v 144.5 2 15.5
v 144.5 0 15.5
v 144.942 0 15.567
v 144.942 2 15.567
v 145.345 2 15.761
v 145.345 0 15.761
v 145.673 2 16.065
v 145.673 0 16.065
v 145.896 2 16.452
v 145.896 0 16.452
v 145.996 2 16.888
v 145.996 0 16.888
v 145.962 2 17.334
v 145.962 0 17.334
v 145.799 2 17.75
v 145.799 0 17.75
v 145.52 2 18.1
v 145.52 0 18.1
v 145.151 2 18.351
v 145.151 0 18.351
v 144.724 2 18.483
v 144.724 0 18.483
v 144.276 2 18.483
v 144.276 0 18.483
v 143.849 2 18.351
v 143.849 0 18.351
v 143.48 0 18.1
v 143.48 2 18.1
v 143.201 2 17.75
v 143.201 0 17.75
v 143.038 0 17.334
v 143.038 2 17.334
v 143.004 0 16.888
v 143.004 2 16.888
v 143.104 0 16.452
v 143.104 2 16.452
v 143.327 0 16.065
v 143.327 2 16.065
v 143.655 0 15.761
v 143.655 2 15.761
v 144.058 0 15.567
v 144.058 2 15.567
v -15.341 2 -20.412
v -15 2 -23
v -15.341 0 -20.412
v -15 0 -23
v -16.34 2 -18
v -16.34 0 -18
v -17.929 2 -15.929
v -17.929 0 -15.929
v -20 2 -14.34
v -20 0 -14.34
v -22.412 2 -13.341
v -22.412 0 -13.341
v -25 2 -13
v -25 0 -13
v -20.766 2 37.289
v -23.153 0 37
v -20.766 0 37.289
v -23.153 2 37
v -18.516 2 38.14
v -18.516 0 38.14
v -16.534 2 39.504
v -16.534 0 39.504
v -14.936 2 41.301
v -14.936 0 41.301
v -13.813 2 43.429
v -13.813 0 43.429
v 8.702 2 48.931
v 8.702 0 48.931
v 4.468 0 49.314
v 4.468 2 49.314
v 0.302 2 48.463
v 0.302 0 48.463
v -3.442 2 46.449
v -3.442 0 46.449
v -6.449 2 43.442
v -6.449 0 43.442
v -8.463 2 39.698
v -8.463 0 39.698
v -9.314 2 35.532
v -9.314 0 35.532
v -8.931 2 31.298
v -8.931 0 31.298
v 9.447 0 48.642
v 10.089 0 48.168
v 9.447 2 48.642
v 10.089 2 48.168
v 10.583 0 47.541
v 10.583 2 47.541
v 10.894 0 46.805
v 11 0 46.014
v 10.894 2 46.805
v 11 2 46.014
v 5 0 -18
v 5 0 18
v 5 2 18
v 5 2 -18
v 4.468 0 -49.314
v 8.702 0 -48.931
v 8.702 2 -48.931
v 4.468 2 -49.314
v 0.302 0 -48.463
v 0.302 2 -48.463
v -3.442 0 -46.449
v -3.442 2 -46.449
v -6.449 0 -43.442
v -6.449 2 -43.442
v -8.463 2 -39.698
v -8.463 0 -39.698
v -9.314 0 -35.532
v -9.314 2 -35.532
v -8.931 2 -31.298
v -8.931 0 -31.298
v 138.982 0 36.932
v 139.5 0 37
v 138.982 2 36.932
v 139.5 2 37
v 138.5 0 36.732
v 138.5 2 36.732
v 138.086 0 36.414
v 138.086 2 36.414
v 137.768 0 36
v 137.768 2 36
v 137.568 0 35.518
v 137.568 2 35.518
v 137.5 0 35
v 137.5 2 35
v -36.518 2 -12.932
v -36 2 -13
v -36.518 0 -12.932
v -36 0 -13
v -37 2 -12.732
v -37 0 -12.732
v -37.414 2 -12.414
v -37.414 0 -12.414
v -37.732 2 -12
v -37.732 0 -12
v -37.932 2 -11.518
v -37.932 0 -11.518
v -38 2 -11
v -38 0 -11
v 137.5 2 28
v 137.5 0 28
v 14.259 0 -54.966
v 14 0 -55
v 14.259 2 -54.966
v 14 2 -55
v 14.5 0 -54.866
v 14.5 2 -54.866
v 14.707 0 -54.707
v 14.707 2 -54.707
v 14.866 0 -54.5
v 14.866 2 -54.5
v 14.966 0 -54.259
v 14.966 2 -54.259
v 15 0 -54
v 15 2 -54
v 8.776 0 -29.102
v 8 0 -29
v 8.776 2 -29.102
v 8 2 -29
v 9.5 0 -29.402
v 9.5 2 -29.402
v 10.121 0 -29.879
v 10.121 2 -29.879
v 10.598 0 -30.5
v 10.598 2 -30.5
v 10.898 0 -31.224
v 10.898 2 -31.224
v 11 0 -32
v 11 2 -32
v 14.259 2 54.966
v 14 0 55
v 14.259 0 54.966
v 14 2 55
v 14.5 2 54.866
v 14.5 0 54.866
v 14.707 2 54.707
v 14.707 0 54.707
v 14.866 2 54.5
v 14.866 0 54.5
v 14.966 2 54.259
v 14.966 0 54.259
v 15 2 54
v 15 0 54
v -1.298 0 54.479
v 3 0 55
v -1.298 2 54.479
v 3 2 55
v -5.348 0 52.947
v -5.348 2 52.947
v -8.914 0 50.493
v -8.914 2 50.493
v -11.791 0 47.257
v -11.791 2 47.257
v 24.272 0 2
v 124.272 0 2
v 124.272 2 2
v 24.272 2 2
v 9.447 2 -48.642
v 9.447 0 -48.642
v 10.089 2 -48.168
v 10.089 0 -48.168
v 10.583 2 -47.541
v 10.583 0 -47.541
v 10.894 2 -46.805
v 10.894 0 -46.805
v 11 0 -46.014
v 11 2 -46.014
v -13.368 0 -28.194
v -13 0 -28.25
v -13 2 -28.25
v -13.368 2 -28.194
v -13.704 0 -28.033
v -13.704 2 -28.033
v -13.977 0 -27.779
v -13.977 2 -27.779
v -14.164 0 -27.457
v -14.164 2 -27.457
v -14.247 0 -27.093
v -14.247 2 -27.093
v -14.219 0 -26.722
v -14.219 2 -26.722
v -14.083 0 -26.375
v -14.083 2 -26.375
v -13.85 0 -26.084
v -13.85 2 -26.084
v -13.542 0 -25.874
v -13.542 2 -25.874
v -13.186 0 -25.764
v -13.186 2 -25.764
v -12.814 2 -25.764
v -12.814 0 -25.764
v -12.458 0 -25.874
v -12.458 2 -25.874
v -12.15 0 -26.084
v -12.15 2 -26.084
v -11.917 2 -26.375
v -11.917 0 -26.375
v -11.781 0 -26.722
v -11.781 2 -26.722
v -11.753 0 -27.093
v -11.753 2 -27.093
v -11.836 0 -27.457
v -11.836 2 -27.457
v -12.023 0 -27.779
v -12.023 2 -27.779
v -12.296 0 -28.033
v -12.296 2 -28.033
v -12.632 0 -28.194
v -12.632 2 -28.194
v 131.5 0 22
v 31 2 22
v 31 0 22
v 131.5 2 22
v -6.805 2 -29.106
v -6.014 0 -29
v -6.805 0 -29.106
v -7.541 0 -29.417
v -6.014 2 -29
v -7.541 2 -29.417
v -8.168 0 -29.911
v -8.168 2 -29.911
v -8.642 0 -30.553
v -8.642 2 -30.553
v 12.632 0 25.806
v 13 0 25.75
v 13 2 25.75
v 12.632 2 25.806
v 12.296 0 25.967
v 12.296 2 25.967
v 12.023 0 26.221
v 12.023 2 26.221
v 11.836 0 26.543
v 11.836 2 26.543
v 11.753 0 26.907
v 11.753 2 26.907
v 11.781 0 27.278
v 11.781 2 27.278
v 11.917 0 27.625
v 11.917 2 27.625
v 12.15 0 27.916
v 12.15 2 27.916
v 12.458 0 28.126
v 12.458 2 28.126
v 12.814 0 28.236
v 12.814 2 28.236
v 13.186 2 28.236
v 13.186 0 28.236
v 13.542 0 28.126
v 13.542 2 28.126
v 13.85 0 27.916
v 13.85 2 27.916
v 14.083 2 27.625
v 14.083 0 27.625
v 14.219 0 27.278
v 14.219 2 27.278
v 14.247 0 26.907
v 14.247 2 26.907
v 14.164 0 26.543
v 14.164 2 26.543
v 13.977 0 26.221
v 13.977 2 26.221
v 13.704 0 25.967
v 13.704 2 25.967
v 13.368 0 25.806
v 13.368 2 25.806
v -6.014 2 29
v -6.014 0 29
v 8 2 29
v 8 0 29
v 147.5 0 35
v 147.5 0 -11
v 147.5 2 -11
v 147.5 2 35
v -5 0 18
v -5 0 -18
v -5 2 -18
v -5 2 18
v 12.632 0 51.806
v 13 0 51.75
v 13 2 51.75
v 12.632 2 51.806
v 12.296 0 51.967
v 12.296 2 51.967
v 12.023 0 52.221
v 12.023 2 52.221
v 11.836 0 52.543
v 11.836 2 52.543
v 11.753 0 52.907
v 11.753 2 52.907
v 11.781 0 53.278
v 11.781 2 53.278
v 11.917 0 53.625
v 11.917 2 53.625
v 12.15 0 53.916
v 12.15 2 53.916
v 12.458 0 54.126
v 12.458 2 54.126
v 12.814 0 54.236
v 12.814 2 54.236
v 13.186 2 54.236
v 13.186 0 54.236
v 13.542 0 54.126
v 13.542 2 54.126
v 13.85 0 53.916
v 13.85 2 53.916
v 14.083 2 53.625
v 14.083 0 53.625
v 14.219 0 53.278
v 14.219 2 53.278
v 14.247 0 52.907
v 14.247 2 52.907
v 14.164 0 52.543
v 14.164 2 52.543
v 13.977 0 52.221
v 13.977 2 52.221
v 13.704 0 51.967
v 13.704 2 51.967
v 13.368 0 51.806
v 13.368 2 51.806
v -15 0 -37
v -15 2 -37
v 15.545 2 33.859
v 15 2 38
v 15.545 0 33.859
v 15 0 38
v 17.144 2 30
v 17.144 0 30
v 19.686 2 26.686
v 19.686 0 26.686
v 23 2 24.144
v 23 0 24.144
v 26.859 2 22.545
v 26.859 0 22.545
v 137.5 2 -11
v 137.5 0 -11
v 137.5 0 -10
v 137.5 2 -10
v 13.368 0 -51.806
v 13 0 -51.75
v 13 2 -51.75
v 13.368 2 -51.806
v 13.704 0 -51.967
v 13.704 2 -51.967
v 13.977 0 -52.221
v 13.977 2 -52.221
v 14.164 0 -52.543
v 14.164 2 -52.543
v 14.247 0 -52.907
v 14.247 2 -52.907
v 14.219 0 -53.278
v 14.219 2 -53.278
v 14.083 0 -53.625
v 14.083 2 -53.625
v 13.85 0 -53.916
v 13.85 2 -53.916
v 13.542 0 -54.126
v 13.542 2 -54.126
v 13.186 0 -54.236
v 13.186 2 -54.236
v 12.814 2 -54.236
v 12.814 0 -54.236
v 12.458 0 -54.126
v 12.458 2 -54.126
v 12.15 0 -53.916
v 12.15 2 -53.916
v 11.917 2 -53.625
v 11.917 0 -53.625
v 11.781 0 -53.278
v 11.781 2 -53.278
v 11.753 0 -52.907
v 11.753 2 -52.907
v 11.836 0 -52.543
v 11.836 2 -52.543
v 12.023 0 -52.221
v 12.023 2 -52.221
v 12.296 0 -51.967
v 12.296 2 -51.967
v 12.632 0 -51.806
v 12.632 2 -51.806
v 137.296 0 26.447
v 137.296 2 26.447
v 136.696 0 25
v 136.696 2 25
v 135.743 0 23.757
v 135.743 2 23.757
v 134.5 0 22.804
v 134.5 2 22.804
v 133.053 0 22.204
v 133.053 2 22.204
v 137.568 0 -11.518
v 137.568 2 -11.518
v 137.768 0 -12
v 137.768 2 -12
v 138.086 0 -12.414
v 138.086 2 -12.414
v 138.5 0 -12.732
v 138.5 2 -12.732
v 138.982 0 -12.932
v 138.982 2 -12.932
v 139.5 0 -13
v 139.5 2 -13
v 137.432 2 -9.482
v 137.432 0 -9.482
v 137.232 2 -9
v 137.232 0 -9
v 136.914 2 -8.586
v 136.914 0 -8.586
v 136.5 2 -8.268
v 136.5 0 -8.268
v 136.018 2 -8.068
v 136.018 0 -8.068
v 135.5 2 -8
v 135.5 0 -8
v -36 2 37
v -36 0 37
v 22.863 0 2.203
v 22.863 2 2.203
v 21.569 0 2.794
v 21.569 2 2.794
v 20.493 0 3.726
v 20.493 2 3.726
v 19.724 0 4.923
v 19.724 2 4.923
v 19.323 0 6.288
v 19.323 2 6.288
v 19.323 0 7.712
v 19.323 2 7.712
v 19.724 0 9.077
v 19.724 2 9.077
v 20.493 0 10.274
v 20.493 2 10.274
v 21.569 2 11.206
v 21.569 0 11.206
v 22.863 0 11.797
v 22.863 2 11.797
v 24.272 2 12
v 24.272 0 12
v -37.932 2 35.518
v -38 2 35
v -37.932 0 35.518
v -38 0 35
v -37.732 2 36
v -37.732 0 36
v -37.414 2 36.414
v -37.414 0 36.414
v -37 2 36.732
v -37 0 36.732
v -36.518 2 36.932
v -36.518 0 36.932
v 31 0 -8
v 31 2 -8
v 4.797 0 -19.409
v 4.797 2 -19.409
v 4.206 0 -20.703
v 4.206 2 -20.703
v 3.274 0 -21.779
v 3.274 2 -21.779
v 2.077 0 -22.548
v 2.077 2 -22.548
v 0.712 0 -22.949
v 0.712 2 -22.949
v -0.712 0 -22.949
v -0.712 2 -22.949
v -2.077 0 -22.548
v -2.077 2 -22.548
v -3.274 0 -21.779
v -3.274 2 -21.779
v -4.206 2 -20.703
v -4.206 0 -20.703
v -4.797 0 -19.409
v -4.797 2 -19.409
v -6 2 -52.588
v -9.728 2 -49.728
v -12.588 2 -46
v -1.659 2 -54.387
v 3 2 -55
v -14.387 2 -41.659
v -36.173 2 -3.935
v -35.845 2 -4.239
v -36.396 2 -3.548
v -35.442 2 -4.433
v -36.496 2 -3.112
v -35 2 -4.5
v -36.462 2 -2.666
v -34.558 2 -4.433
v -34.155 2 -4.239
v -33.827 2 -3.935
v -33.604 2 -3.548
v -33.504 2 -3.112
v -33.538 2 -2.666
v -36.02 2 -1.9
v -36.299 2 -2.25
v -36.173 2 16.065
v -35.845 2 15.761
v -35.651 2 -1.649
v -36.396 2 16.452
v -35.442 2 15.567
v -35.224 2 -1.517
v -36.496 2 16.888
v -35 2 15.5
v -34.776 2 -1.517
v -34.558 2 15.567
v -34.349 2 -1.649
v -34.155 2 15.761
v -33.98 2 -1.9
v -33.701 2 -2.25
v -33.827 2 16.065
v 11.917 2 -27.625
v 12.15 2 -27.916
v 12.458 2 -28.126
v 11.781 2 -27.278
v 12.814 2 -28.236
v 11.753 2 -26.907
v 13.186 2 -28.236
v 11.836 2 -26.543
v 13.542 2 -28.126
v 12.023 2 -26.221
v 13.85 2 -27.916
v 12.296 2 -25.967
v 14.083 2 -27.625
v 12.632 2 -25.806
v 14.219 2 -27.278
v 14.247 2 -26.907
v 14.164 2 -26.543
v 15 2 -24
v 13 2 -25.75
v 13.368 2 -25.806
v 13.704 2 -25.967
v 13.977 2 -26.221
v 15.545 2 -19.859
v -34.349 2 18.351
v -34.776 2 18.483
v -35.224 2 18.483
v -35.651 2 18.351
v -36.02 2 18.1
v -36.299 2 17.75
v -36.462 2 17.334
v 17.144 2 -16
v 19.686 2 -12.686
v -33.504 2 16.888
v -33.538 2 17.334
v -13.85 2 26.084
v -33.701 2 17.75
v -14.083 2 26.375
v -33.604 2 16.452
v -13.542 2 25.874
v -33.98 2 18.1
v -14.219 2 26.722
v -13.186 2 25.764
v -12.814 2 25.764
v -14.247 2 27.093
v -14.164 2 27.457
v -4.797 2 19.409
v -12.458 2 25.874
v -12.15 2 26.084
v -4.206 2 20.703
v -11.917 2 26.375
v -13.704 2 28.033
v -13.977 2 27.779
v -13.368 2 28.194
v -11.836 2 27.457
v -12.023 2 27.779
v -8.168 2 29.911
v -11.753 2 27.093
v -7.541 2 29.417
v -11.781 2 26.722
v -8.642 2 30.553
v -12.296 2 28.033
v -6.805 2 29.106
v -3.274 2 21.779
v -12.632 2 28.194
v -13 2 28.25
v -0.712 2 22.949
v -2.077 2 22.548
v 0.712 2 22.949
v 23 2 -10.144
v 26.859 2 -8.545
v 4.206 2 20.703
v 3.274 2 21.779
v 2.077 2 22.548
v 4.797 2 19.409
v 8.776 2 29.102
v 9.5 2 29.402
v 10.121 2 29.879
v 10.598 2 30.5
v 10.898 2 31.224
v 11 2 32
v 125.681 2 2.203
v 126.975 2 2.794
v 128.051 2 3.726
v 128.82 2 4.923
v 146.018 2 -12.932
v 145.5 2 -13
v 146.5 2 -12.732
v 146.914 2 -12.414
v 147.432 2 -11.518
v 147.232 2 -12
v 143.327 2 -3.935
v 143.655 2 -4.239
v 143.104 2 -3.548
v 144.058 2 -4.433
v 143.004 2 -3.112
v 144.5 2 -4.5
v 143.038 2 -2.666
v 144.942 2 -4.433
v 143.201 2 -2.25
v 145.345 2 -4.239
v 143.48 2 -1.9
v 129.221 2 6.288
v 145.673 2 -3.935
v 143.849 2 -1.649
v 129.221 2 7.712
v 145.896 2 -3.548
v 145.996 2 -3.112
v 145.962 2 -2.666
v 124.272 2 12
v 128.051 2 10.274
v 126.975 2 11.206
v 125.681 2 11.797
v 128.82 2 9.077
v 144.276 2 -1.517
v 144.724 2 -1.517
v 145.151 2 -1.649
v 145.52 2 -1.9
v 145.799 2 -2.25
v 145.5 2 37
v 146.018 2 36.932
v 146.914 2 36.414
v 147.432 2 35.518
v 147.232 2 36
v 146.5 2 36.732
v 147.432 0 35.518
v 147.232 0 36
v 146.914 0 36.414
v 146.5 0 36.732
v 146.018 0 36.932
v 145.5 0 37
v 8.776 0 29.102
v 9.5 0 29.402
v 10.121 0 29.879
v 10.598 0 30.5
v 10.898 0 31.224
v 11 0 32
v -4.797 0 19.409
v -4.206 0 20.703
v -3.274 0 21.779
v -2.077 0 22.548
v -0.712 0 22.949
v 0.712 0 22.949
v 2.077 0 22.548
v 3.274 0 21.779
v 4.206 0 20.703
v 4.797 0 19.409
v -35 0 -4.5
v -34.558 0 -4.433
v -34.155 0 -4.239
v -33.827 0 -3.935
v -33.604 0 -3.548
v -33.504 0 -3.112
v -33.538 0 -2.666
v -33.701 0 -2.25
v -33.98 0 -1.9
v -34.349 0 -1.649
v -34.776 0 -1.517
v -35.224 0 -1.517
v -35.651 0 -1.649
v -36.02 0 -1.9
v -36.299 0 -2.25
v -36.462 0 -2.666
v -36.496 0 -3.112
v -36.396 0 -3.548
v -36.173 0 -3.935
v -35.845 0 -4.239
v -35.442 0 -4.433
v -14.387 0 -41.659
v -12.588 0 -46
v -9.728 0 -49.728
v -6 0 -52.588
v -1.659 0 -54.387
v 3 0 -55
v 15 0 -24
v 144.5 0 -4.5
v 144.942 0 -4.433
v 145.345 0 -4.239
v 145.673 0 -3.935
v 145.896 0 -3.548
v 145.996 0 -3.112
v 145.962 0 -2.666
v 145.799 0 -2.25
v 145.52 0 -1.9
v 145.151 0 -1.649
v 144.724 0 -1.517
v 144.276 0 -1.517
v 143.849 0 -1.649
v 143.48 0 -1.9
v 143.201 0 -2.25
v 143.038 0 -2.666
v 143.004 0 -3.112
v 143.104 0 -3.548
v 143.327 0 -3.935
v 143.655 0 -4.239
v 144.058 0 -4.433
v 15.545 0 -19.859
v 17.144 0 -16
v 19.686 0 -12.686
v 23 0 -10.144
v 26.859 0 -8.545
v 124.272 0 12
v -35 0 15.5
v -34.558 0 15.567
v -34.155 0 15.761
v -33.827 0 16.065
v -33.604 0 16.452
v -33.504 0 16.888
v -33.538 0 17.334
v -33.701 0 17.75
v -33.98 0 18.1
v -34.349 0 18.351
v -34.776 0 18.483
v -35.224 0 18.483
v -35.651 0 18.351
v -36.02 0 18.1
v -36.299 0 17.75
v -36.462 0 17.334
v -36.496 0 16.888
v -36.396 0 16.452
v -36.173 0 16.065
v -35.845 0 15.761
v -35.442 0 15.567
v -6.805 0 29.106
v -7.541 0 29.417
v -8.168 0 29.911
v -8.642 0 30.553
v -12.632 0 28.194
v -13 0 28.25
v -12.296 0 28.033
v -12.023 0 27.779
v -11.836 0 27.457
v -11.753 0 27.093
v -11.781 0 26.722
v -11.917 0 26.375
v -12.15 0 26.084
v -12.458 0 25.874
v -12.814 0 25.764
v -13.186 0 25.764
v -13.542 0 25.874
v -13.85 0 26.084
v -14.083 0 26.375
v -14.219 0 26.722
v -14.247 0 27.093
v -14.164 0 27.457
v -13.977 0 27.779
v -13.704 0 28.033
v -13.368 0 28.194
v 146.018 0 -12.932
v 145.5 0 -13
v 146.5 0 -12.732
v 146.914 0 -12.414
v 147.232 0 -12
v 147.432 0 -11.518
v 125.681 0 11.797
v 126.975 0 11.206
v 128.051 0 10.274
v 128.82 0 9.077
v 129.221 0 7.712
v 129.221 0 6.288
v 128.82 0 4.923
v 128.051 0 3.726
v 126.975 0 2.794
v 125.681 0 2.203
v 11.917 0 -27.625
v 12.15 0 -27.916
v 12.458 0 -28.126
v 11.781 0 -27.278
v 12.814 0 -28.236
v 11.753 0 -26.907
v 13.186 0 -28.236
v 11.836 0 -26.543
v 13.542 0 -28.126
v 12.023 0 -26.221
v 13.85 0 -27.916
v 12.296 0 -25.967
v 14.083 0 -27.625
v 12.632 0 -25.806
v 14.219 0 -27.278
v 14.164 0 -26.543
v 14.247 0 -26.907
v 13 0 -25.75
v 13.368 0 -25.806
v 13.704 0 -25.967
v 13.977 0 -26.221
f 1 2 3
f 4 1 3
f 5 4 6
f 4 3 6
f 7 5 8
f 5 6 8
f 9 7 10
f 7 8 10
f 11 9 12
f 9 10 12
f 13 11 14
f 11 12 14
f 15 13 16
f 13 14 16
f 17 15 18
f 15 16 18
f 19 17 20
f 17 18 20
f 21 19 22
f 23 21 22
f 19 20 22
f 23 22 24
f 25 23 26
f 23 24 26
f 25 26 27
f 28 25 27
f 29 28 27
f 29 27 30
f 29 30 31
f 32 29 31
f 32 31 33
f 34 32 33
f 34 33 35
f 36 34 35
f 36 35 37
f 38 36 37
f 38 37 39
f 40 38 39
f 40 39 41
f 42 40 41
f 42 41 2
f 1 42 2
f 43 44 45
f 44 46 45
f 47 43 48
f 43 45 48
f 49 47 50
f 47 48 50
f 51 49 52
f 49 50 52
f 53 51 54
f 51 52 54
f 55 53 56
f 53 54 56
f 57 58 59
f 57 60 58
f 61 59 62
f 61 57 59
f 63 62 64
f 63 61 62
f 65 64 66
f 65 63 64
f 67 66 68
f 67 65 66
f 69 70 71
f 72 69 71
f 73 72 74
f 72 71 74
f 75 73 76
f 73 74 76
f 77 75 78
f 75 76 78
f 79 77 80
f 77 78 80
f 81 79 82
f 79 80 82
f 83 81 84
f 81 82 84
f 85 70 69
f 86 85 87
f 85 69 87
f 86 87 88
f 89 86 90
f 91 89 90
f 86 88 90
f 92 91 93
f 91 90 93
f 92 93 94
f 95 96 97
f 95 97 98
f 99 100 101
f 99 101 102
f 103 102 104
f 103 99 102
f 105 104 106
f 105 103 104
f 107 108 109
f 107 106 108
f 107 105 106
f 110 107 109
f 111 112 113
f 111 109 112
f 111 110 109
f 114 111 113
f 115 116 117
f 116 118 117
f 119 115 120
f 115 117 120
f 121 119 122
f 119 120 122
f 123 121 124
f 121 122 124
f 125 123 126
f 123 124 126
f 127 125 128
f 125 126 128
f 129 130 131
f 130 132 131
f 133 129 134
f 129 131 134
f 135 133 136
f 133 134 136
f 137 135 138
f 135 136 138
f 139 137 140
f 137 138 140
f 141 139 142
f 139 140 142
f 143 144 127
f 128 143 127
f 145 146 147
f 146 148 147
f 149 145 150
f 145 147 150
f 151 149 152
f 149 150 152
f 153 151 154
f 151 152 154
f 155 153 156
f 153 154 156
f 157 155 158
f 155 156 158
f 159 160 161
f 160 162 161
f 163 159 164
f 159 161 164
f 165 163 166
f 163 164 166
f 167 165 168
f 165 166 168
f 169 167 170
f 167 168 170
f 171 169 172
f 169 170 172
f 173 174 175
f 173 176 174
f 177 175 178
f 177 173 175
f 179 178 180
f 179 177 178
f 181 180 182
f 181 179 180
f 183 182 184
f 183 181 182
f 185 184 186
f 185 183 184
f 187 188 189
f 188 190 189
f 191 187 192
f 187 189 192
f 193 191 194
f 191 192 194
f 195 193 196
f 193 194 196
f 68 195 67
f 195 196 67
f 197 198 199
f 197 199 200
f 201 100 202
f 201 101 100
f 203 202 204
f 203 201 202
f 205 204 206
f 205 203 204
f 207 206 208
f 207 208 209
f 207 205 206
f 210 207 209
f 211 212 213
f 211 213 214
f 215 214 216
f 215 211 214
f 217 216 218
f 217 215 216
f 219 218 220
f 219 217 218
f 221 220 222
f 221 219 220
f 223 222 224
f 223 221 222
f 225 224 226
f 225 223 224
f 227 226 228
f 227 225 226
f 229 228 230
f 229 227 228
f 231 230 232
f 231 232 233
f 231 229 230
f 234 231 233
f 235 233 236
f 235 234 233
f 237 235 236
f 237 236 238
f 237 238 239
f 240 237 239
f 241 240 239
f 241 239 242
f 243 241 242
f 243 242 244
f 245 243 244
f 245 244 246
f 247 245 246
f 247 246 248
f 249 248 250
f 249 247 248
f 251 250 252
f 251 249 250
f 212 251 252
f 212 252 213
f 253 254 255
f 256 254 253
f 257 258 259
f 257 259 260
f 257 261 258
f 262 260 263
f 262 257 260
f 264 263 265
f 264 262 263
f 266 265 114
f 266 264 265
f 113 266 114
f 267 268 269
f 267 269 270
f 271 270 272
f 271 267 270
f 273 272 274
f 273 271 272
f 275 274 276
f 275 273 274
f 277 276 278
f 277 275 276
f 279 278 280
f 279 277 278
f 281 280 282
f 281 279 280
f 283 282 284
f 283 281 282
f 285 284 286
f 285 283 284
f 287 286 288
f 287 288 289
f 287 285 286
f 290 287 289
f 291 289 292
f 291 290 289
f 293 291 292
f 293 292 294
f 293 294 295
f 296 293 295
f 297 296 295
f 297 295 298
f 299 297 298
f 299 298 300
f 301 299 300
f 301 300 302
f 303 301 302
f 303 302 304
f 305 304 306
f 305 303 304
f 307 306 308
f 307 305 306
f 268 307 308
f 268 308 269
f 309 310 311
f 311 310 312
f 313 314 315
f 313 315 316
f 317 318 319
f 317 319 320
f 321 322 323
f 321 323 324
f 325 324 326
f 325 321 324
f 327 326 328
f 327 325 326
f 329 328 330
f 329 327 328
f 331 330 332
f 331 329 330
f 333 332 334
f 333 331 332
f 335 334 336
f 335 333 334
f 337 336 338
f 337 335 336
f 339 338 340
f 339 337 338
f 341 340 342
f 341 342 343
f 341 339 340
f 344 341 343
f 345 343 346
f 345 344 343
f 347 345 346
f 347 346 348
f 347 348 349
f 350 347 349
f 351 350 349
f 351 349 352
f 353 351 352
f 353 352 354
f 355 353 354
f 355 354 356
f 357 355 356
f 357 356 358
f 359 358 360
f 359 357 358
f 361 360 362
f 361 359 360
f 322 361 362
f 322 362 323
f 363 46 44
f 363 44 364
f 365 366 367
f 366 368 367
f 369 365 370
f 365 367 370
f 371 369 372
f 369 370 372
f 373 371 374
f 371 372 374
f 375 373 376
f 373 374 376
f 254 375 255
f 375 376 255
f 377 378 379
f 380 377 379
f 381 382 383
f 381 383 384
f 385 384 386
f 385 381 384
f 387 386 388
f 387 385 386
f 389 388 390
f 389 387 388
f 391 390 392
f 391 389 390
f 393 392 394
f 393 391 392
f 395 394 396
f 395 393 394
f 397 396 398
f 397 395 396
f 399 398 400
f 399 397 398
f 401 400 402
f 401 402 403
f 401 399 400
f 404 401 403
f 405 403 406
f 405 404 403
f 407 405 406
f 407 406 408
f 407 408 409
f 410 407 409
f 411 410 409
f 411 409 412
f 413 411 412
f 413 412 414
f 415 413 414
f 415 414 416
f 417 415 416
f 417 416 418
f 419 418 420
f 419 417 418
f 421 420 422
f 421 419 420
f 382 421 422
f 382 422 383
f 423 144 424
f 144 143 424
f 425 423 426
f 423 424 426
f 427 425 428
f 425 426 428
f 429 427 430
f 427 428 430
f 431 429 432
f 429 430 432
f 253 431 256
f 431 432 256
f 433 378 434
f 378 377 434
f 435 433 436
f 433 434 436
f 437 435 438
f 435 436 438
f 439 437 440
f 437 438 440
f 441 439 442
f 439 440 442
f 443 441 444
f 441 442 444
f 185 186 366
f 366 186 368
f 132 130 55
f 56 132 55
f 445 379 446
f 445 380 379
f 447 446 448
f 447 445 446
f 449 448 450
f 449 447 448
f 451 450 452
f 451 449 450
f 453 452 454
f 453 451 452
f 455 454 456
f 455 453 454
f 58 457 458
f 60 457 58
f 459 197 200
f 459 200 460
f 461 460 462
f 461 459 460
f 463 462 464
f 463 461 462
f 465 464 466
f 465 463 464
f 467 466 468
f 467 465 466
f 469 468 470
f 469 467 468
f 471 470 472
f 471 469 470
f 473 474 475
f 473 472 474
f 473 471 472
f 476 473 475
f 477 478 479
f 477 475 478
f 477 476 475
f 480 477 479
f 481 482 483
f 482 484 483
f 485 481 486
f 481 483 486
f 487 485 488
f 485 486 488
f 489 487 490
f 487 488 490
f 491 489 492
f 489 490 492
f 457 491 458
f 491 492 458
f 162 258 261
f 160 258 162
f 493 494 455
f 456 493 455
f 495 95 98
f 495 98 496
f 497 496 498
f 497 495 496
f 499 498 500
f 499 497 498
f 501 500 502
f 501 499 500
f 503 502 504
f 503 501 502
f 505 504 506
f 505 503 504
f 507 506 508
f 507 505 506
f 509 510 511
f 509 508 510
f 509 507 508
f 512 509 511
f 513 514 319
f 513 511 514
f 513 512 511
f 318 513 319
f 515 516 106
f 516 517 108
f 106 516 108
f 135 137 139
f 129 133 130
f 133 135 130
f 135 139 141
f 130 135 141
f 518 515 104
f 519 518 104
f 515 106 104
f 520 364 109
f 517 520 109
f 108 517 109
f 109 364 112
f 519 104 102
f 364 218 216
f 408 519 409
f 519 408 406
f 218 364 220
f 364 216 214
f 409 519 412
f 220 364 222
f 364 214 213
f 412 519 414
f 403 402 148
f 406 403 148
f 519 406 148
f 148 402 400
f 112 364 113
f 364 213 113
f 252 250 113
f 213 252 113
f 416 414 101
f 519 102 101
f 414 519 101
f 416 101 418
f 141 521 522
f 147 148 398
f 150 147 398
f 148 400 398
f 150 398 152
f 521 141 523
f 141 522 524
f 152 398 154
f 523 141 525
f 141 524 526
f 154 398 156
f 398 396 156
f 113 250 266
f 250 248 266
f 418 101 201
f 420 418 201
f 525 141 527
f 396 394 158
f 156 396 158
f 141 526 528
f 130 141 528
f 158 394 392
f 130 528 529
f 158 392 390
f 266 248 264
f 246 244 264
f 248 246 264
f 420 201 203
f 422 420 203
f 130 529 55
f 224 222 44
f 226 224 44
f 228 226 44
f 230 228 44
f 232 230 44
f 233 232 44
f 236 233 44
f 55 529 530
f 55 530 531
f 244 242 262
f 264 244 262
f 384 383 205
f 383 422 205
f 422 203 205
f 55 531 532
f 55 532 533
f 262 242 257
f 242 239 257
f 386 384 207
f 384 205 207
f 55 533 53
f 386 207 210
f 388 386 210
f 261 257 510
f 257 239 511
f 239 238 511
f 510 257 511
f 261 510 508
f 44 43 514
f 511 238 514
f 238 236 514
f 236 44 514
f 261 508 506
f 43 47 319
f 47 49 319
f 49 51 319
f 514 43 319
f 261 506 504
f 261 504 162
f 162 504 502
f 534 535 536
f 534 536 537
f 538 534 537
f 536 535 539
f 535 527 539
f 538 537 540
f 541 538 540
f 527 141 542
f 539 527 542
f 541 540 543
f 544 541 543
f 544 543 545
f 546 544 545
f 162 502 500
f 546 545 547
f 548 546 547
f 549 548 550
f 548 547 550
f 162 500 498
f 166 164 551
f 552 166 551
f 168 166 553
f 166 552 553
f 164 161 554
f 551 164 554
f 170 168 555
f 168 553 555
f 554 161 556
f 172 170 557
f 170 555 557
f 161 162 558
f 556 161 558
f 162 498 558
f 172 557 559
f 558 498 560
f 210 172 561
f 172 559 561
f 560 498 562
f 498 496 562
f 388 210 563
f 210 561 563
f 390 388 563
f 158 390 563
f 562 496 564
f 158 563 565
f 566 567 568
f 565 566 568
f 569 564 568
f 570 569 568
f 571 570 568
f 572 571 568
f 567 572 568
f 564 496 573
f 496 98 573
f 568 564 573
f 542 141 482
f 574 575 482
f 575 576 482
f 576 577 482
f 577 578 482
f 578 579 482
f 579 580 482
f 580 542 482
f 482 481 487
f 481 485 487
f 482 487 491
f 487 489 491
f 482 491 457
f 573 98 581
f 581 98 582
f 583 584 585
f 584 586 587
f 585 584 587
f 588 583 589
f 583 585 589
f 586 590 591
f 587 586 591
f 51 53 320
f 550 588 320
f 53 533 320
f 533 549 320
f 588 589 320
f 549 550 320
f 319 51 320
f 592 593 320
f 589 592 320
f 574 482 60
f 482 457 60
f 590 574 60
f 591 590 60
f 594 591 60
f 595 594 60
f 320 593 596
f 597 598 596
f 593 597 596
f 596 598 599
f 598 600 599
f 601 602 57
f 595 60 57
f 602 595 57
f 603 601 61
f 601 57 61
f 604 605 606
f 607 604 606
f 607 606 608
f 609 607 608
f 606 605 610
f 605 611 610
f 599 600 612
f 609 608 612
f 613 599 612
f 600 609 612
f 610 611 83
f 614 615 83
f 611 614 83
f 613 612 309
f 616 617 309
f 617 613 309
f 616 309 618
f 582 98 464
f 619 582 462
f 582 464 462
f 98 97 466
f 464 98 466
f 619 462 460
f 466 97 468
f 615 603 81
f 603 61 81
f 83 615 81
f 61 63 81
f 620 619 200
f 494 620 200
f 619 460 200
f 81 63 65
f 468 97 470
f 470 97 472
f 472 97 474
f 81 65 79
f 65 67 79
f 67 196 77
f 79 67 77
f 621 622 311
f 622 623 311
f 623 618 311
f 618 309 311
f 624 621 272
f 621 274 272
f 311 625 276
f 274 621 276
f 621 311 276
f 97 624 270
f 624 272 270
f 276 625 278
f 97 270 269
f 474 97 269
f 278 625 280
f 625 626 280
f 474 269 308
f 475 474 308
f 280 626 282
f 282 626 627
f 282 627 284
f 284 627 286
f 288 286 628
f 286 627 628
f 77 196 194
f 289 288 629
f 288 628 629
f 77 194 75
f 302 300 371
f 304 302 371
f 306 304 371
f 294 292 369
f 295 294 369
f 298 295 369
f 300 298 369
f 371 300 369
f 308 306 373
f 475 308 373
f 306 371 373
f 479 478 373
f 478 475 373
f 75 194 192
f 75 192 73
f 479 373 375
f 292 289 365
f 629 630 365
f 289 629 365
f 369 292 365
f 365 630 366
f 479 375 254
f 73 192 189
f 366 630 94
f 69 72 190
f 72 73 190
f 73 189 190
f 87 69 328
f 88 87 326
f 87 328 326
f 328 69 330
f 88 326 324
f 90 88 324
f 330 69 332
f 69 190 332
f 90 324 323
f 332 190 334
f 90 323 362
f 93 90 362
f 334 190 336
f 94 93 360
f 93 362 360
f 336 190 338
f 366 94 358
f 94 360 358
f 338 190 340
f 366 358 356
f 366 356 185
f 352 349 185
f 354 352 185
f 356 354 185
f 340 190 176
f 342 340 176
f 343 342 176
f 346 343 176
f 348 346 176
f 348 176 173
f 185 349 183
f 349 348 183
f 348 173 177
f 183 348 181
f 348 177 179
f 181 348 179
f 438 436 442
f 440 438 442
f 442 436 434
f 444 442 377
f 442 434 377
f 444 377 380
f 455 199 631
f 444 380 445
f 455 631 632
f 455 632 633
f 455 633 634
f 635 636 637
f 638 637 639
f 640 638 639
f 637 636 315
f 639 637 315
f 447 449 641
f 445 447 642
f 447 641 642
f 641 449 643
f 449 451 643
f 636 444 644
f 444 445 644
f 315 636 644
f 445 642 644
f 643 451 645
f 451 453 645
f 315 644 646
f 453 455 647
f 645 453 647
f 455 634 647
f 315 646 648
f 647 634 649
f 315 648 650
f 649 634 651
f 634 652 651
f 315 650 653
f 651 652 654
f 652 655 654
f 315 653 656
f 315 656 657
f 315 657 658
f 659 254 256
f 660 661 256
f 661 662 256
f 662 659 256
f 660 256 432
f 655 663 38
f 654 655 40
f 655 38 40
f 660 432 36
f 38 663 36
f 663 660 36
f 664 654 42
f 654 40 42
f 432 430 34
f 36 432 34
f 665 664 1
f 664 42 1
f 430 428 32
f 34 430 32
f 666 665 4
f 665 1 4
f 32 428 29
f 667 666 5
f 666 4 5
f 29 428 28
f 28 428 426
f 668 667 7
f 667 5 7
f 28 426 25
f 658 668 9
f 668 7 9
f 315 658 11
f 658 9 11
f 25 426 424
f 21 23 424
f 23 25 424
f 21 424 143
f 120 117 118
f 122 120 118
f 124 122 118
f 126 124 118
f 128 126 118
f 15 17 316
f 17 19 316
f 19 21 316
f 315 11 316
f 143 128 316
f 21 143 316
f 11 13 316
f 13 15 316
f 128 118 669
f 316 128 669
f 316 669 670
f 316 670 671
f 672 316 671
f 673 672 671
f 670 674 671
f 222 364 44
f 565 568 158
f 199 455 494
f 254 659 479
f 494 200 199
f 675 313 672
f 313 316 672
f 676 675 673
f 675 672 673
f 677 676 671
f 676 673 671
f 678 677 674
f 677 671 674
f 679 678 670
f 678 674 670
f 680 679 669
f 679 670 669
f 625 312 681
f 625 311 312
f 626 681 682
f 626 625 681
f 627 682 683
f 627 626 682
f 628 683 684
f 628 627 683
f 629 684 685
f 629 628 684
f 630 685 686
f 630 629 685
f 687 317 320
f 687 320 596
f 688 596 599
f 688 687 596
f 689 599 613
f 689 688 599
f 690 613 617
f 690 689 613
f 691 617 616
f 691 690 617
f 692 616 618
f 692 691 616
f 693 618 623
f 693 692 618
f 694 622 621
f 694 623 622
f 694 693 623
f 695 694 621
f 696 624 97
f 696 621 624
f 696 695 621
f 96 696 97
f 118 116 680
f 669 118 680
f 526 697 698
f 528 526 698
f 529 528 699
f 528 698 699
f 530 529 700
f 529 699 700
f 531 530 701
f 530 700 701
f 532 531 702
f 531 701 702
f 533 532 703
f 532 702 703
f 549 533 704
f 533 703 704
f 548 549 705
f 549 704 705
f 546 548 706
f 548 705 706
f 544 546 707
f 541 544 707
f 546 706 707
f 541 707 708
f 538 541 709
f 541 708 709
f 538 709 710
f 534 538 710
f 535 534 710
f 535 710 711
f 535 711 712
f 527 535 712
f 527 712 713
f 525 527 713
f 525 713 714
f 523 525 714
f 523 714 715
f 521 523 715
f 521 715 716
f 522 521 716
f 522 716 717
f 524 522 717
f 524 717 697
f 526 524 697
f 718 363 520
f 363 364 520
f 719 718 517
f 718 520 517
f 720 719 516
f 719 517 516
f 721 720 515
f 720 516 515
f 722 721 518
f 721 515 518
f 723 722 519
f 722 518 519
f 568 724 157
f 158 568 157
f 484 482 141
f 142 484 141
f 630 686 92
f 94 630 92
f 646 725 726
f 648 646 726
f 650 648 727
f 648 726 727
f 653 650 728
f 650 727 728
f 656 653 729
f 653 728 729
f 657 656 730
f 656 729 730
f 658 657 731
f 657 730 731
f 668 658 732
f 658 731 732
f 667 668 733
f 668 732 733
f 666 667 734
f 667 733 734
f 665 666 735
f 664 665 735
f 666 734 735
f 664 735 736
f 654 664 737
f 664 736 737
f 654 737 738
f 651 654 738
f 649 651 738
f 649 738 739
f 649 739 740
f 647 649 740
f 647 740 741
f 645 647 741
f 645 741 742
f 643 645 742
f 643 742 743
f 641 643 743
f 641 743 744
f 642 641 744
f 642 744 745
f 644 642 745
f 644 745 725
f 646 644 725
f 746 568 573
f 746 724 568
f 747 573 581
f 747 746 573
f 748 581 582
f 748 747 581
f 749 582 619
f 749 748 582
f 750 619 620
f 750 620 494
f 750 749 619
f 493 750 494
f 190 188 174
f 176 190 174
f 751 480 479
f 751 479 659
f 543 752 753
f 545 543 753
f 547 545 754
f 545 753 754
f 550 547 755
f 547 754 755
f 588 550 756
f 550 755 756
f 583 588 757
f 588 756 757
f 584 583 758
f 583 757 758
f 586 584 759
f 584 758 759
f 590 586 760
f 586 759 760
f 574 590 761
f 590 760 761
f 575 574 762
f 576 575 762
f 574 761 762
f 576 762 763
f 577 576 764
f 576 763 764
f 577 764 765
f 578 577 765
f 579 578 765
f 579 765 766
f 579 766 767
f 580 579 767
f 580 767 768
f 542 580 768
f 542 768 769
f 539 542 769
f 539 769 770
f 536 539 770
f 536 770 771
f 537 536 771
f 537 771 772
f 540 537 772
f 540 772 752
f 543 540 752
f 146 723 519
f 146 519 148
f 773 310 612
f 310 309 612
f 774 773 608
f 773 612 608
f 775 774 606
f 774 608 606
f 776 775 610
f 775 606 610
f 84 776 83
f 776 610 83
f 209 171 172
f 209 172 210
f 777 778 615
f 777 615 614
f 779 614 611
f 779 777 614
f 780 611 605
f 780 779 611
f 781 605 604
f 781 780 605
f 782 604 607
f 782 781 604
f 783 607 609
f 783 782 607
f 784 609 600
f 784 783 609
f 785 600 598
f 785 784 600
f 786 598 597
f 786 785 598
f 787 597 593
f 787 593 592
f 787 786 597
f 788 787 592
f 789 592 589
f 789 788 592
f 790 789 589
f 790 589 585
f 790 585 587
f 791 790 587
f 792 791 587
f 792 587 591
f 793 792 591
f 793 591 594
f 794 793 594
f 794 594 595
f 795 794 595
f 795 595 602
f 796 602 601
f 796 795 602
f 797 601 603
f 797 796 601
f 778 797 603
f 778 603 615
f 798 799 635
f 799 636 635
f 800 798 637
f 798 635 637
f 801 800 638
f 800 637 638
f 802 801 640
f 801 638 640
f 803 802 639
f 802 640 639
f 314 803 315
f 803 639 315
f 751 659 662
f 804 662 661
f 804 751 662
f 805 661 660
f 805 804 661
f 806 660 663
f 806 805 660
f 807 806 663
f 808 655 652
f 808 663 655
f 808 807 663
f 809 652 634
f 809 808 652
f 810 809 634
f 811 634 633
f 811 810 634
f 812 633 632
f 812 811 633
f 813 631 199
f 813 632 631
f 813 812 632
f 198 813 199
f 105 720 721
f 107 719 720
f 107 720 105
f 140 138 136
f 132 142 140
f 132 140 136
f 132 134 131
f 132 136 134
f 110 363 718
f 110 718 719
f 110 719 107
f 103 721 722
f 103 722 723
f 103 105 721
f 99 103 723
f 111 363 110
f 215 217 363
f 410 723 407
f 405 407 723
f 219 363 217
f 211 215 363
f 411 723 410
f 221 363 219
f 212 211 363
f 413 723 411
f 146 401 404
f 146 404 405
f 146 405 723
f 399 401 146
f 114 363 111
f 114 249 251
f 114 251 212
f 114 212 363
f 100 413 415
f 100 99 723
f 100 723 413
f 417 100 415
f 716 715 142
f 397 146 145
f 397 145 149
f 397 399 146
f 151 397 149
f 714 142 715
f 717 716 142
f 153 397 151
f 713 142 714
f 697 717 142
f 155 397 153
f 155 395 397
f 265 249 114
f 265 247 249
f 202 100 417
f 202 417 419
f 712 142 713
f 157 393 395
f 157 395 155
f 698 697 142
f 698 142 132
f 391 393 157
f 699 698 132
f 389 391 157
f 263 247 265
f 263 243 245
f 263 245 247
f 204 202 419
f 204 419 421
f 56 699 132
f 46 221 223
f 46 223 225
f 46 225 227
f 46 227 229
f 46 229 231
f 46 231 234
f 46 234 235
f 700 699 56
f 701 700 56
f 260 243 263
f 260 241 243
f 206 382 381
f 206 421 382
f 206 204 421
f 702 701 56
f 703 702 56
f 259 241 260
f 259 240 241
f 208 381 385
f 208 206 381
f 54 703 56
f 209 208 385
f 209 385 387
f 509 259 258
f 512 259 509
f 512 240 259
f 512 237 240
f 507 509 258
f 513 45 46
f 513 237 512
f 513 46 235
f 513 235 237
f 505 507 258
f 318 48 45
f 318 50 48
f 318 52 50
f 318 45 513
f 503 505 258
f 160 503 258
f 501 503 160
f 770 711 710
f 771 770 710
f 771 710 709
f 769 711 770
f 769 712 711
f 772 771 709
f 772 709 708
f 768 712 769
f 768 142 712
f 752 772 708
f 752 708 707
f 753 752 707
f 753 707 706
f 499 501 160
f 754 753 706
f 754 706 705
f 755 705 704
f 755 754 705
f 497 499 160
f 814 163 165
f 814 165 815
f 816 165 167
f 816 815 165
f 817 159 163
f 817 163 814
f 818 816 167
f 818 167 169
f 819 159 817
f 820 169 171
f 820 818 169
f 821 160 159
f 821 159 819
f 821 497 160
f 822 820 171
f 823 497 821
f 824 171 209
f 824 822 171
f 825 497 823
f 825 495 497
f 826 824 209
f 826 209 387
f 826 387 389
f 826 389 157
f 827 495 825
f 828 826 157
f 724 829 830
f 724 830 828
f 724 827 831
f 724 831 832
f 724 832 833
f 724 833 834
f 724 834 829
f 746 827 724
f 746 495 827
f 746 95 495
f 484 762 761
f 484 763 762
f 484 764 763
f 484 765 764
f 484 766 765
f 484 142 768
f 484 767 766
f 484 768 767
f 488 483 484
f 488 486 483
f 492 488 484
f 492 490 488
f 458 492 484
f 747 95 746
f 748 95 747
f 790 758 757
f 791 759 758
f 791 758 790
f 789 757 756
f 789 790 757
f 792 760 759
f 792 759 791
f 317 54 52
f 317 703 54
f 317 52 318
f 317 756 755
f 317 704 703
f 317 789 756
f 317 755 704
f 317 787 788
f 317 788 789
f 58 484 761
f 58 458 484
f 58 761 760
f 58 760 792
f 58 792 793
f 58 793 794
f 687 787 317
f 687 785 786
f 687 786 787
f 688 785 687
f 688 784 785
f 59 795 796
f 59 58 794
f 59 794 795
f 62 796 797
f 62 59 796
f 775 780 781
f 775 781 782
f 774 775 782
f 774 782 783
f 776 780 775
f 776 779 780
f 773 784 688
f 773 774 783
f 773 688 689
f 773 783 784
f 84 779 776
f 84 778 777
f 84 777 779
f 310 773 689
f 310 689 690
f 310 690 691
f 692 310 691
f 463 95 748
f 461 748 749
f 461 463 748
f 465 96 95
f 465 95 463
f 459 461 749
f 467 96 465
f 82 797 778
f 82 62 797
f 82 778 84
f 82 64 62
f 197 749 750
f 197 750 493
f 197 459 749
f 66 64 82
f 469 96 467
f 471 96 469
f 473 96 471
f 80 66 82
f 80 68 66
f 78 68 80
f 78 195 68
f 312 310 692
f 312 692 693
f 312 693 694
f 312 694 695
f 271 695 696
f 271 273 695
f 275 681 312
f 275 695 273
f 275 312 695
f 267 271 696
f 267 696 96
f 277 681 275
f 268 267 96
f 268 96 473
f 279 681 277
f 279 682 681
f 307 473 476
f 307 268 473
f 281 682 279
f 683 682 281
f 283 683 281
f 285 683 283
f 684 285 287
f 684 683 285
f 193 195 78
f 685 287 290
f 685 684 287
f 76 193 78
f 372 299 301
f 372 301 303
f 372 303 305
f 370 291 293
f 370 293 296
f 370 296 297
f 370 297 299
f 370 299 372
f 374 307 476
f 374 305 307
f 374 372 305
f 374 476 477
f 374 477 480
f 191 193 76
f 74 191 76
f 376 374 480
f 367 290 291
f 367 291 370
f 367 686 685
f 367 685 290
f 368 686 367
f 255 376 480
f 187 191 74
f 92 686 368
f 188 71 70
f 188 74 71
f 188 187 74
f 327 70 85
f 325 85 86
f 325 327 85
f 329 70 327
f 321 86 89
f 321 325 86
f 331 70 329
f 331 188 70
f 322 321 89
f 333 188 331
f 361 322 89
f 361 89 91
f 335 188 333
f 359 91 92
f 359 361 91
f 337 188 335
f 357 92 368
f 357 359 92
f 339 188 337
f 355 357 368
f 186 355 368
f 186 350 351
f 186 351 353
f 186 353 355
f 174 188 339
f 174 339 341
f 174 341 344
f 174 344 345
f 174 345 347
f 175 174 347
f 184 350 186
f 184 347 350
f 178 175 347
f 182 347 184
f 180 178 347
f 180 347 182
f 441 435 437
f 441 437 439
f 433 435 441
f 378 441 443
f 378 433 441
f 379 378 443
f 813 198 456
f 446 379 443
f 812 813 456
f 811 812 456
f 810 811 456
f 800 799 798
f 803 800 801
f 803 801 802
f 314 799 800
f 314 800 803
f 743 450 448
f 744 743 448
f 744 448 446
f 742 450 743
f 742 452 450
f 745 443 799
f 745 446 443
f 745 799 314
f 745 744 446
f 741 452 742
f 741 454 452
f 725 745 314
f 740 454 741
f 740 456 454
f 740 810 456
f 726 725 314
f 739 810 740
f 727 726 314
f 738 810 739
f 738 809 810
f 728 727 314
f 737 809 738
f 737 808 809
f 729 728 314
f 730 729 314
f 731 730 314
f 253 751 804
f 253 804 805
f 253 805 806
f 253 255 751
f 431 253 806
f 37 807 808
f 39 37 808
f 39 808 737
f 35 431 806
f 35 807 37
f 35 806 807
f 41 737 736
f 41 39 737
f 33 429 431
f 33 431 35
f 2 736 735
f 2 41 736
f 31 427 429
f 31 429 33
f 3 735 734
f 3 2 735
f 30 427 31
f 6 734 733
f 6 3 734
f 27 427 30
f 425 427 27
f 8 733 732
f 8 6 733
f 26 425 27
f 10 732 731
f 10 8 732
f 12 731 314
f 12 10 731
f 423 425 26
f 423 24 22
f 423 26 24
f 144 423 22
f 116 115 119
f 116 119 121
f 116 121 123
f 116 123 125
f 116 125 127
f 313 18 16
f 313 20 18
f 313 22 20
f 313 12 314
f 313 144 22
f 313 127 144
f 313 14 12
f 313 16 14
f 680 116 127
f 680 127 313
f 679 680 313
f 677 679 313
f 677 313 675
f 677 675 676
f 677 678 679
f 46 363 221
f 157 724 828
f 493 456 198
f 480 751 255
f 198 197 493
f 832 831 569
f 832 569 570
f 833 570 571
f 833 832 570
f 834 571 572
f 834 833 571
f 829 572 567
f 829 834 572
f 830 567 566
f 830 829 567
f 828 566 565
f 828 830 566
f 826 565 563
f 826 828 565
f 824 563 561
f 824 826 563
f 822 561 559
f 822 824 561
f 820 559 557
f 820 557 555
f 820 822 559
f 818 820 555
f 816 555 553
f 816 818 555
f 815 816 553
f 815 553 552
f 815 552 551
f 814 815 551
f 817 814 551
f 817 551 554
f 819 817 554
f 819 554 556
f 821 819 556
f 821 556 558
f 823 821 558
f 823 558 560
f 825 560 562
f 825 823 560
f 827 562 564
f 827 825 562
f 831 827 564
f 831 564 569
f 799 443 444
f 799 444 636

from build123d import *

# Parameters (mm, degrees)
SKETCH_1_W          = 30
SKETCH_1_H          = 110
SKETCH_1_R          = 1.25
EXTRUDE_1_DEPTH     = 2
FILLET_1_R          = 1
FILLET_2_R          = 18
SKETCH_2_W          = 23
SKETCH_2_H          = 50
EXTRUDE_2_DEPTH     = 2
SKETCH_3_W          = 132.5
SKETCH_3_H          = 30
EXTRUDE_3_DEPTH     = 2
FILLET_3_R          = 16
SKETCH_4_W          = 10
SKETCH_4_H          = 50
EXTRUDE_4_DEPTH     = 2
FILLET_5_R          = 6
FILLET_6_R          = 2
FILLET_7_R          = 2
CUT_EXTRUDE_1_DEPTH = 10
CUT_EXTRUDE_2_DEPTH = 10
FILLET_9_R          = 10
CUT_EXTRUDE_3_DEPTH = 10
FILLET_10_R         = 3
SKETCH_8_R          = 1.5
CUT_EXTRUDE_4_DEPTH = 10


with BuildPart() as part:
    # 草图1 → 凸台-拉伸1 (new body)
    with BuildSketch(Plane(origin=(0, 0, 0), x_dir=(1, 0, 0), z_dir=(0, 1, 0))):
        Rectangle(SKETCH_1_W, SKETCH_1_H)
        with Locations(Location((13, 27, 0), (0, 0, 270))):
            Circle(SKETCH_1_R, mode=Mode.SUBTRACT)
        with Locations(Location((-13, 27, 0), (0, 0, 90))):
            Circle(SKETCH_1_R, mode=Mode.SUBTRACT)
        with Locations(Location((-13, -27, 0), (0, 0, 270))):
            Circle(SKETCH_1_R, mode=Mode.SUBTRACT)
        with Locations(Location((13, -27, 0), (0, 0, 90))):
            Circle(SKETCH_1_R, mode=Mode.SUBTRACT)
        with Locations(Location((13, 53, 0), (0, 0, 270))):
            Circle(SKETCH_1_R, mode=Mode.SUBTRACT)
        with Locations(Location((13, -53, 0), (0, 0, 90))):
            Circle(SKETCH_1_R, mode=Mode.SUBTRACT)
    extrude(amount=EXTRUDE_1_DEPTH)

    # 圆角1
    fillet_1_edges = [part.edges().sort_by_distance(p)[0] for p in [
        (15, 1, 55),
        (15, 1, -55),
    ]]
    fillet(fillet_1_edges, radius=FILLET_1_R)

    # 圆角2
    fillet_2_edges = [part.edges().sort_by_distance(p)[0] for p in [
        (-15, 1, 55),
        (-15, 1, -55),
    ]]
    fillet(fillet_2_edges, radius=FILLET_2_R)

    # 草图2 → 凸台-拉伸2 (add)
    with BuildSketch(Plane(origin=(0, 2, 0), x_dir=(1, 0, 0), z_dir=(0, 1, 0))):
        with Locations((-26.5, -12)):
            Rectangle(SKETCH_2_W, SKETCH_2_H)
    extrude(amount=-EXTRUDE_2_DEPTH)

    # 草图3 → 凸台-拉伸3 (add)
    with BuildSketch(Plane(origin=(0, 2, 0), x_dir=(1, 0, 0), z_dir=(0, 1, 0))):
        with Locations((81.25, -7)):
            Rectangle(SKETCH_3_W, SKETCH_3_H)
    extrude(amount=-EXTRUDE_3_DEPTH)

    # 圆角3
    fillet_3_edges = [part.edges().sort_by_distance(p)[0] for p in [
        (15, 1, 22),
        (15, 1, -8),
    ]]
    fillet(fillet_3_edges, radius=FILLET_3_R)

    # 草图4 → 凸台-拉伸4 (add)
    with BuildSketch(Plane.XZ):
        with Locations((142.5, 12)):
            Rectangle(SKETCH_4_W, SKETCH_4_H)
    extrude(amount=-EXTRUDE_4_DEPTH)

    # 圆角5
    fillet_5_edges = [part.edges().sort_by_distance(p)[0] for p in [
        (137.5, 1, 22),
    ]]
    fillet(fillet_5_edges, radius=FILLET_5_R)

    # 圆角6
    fillet_6_edges = [part.edges().sort_by_distance(p)[0] for p in [
        (137.5, 1, -8),
    ]]
    fillet(fillet_6_edges, radius=FILLET_6_R)

    # 圆角7
    fillet_7_edges = [part.edges().sort_by_distance(p)[0] for p in [
        (147.5, 1, 37),
        (137.5, 1, -13),
        (137.5, 1, 37),
        (147.5, 1, -13),
        (-38, 1, 37),
        (-38, 1, -13),
    ]]
    fillet(fillet_7_edges, radius=FILLET_7_R)

    # 草图5 → 切除-拉伸1 (cut)
    with BuildSketch(Plane.XZ):
        with BuildLine():
            Line((-8.171572875, 29), (11, 29))
            Line((11, 29), (11, 48.171572875))
            ThreePointArc((11, 48.171572875), (-5.055430247, 45.055430247), (-8.171572875, 29))
        make_face()
        with BuildLine():
            Line((11, -29), (11, -48.171572875))
            ThreePointArc((11, -48.171572875), (-5.055430247, -45.055430247), (-8.171572875, -29))
            Line((-8.171572875, -29), (11, -29))
        make_face()
    extrude(amount=-CUT_EXTRUDE_1_DEPTH, mode=Mode.SUBTRACT)

    # 草图6 → 切除-拉伸2 (cut)
    with BuildSketch(Plane.XZ):
        with BuildLine():
            Line((-5, -18), (-5, 18))
            ThreePointArc((-5, 18), (0, 23), (5, 18))
            Line((5, 18), (5, -18))
            ThreePointArc((5, -18), (0, -23), (-5, -18))
        make_face()
    extrude(amount=-CUT_EXTRUDE_2_DEPTH, mode=Mode.SUBTRACT)

    # 圆角9
    fillet_9_edges = [part.edges().sort_by_distance(p)[0] for p in [
        (-15, 1, 37),
        (-15, 1, -13),
    ]]
    fillet(fillet_9_edges, radius=FILLET_9_R)

    # 草图7 → 切除-拉伸3 (cut)
    with BuildSketch(Plane.XZ):
        with BuildLine():
            Line((24.271968642, 12), (124.271968642, 12))
            ThreePointArc((124.271968642, 12), (129.271968642, 7), (124.271968642, 2))
            Line((124.271968642, 2), (24.271968642, 2))
            ThreePointArc((24.271968642, 2), (19.271968642, 7), (24.271968642, 12))
        make_face()
    extrude(amount=-CUT_EXTRUDE_3_DEPTH, mode=Mode.SUBTRACT)

    # 圆角10
    fillet_10_edges = [part.edges().sort_by_distance(p)[0] for p in [
        (-8.171572875, 1, 29),
        (11, 1, 48.171572875),
        (11, 1, 29),
        (11, 1, -48.171572875),
        (-8.171572875, 1, -29),
        (11, 1, -29),
    ]]
    fillet(fillet_10_edges, radius=FILLET_10_R)

    # 草图8 → 切除-拉伸4 (cut)
    with BuildSketch(Plane.XZ):
        with Locations(Location((-35, 17, 0), (0, 0, 270))):
            Circle(SKETCH_8_R)
        with Locations(Location((-35, -3, 0), (0, 0, 270))):
            Circle(SKETCH_8_R)
        with Locations(Location((144.5, 17, 0), (0, 0, 270))):
            Circle(SKETCH_8_R)
        with Locations(Location((144.5, -3, 0), (0, 0, 270))):
            Circle(SKETCH_8_R)
    extrude(amount=-CUT_EXTRUDE_4_DEPTH, mode=Mode.SUBTRACT)


solid = part.part
